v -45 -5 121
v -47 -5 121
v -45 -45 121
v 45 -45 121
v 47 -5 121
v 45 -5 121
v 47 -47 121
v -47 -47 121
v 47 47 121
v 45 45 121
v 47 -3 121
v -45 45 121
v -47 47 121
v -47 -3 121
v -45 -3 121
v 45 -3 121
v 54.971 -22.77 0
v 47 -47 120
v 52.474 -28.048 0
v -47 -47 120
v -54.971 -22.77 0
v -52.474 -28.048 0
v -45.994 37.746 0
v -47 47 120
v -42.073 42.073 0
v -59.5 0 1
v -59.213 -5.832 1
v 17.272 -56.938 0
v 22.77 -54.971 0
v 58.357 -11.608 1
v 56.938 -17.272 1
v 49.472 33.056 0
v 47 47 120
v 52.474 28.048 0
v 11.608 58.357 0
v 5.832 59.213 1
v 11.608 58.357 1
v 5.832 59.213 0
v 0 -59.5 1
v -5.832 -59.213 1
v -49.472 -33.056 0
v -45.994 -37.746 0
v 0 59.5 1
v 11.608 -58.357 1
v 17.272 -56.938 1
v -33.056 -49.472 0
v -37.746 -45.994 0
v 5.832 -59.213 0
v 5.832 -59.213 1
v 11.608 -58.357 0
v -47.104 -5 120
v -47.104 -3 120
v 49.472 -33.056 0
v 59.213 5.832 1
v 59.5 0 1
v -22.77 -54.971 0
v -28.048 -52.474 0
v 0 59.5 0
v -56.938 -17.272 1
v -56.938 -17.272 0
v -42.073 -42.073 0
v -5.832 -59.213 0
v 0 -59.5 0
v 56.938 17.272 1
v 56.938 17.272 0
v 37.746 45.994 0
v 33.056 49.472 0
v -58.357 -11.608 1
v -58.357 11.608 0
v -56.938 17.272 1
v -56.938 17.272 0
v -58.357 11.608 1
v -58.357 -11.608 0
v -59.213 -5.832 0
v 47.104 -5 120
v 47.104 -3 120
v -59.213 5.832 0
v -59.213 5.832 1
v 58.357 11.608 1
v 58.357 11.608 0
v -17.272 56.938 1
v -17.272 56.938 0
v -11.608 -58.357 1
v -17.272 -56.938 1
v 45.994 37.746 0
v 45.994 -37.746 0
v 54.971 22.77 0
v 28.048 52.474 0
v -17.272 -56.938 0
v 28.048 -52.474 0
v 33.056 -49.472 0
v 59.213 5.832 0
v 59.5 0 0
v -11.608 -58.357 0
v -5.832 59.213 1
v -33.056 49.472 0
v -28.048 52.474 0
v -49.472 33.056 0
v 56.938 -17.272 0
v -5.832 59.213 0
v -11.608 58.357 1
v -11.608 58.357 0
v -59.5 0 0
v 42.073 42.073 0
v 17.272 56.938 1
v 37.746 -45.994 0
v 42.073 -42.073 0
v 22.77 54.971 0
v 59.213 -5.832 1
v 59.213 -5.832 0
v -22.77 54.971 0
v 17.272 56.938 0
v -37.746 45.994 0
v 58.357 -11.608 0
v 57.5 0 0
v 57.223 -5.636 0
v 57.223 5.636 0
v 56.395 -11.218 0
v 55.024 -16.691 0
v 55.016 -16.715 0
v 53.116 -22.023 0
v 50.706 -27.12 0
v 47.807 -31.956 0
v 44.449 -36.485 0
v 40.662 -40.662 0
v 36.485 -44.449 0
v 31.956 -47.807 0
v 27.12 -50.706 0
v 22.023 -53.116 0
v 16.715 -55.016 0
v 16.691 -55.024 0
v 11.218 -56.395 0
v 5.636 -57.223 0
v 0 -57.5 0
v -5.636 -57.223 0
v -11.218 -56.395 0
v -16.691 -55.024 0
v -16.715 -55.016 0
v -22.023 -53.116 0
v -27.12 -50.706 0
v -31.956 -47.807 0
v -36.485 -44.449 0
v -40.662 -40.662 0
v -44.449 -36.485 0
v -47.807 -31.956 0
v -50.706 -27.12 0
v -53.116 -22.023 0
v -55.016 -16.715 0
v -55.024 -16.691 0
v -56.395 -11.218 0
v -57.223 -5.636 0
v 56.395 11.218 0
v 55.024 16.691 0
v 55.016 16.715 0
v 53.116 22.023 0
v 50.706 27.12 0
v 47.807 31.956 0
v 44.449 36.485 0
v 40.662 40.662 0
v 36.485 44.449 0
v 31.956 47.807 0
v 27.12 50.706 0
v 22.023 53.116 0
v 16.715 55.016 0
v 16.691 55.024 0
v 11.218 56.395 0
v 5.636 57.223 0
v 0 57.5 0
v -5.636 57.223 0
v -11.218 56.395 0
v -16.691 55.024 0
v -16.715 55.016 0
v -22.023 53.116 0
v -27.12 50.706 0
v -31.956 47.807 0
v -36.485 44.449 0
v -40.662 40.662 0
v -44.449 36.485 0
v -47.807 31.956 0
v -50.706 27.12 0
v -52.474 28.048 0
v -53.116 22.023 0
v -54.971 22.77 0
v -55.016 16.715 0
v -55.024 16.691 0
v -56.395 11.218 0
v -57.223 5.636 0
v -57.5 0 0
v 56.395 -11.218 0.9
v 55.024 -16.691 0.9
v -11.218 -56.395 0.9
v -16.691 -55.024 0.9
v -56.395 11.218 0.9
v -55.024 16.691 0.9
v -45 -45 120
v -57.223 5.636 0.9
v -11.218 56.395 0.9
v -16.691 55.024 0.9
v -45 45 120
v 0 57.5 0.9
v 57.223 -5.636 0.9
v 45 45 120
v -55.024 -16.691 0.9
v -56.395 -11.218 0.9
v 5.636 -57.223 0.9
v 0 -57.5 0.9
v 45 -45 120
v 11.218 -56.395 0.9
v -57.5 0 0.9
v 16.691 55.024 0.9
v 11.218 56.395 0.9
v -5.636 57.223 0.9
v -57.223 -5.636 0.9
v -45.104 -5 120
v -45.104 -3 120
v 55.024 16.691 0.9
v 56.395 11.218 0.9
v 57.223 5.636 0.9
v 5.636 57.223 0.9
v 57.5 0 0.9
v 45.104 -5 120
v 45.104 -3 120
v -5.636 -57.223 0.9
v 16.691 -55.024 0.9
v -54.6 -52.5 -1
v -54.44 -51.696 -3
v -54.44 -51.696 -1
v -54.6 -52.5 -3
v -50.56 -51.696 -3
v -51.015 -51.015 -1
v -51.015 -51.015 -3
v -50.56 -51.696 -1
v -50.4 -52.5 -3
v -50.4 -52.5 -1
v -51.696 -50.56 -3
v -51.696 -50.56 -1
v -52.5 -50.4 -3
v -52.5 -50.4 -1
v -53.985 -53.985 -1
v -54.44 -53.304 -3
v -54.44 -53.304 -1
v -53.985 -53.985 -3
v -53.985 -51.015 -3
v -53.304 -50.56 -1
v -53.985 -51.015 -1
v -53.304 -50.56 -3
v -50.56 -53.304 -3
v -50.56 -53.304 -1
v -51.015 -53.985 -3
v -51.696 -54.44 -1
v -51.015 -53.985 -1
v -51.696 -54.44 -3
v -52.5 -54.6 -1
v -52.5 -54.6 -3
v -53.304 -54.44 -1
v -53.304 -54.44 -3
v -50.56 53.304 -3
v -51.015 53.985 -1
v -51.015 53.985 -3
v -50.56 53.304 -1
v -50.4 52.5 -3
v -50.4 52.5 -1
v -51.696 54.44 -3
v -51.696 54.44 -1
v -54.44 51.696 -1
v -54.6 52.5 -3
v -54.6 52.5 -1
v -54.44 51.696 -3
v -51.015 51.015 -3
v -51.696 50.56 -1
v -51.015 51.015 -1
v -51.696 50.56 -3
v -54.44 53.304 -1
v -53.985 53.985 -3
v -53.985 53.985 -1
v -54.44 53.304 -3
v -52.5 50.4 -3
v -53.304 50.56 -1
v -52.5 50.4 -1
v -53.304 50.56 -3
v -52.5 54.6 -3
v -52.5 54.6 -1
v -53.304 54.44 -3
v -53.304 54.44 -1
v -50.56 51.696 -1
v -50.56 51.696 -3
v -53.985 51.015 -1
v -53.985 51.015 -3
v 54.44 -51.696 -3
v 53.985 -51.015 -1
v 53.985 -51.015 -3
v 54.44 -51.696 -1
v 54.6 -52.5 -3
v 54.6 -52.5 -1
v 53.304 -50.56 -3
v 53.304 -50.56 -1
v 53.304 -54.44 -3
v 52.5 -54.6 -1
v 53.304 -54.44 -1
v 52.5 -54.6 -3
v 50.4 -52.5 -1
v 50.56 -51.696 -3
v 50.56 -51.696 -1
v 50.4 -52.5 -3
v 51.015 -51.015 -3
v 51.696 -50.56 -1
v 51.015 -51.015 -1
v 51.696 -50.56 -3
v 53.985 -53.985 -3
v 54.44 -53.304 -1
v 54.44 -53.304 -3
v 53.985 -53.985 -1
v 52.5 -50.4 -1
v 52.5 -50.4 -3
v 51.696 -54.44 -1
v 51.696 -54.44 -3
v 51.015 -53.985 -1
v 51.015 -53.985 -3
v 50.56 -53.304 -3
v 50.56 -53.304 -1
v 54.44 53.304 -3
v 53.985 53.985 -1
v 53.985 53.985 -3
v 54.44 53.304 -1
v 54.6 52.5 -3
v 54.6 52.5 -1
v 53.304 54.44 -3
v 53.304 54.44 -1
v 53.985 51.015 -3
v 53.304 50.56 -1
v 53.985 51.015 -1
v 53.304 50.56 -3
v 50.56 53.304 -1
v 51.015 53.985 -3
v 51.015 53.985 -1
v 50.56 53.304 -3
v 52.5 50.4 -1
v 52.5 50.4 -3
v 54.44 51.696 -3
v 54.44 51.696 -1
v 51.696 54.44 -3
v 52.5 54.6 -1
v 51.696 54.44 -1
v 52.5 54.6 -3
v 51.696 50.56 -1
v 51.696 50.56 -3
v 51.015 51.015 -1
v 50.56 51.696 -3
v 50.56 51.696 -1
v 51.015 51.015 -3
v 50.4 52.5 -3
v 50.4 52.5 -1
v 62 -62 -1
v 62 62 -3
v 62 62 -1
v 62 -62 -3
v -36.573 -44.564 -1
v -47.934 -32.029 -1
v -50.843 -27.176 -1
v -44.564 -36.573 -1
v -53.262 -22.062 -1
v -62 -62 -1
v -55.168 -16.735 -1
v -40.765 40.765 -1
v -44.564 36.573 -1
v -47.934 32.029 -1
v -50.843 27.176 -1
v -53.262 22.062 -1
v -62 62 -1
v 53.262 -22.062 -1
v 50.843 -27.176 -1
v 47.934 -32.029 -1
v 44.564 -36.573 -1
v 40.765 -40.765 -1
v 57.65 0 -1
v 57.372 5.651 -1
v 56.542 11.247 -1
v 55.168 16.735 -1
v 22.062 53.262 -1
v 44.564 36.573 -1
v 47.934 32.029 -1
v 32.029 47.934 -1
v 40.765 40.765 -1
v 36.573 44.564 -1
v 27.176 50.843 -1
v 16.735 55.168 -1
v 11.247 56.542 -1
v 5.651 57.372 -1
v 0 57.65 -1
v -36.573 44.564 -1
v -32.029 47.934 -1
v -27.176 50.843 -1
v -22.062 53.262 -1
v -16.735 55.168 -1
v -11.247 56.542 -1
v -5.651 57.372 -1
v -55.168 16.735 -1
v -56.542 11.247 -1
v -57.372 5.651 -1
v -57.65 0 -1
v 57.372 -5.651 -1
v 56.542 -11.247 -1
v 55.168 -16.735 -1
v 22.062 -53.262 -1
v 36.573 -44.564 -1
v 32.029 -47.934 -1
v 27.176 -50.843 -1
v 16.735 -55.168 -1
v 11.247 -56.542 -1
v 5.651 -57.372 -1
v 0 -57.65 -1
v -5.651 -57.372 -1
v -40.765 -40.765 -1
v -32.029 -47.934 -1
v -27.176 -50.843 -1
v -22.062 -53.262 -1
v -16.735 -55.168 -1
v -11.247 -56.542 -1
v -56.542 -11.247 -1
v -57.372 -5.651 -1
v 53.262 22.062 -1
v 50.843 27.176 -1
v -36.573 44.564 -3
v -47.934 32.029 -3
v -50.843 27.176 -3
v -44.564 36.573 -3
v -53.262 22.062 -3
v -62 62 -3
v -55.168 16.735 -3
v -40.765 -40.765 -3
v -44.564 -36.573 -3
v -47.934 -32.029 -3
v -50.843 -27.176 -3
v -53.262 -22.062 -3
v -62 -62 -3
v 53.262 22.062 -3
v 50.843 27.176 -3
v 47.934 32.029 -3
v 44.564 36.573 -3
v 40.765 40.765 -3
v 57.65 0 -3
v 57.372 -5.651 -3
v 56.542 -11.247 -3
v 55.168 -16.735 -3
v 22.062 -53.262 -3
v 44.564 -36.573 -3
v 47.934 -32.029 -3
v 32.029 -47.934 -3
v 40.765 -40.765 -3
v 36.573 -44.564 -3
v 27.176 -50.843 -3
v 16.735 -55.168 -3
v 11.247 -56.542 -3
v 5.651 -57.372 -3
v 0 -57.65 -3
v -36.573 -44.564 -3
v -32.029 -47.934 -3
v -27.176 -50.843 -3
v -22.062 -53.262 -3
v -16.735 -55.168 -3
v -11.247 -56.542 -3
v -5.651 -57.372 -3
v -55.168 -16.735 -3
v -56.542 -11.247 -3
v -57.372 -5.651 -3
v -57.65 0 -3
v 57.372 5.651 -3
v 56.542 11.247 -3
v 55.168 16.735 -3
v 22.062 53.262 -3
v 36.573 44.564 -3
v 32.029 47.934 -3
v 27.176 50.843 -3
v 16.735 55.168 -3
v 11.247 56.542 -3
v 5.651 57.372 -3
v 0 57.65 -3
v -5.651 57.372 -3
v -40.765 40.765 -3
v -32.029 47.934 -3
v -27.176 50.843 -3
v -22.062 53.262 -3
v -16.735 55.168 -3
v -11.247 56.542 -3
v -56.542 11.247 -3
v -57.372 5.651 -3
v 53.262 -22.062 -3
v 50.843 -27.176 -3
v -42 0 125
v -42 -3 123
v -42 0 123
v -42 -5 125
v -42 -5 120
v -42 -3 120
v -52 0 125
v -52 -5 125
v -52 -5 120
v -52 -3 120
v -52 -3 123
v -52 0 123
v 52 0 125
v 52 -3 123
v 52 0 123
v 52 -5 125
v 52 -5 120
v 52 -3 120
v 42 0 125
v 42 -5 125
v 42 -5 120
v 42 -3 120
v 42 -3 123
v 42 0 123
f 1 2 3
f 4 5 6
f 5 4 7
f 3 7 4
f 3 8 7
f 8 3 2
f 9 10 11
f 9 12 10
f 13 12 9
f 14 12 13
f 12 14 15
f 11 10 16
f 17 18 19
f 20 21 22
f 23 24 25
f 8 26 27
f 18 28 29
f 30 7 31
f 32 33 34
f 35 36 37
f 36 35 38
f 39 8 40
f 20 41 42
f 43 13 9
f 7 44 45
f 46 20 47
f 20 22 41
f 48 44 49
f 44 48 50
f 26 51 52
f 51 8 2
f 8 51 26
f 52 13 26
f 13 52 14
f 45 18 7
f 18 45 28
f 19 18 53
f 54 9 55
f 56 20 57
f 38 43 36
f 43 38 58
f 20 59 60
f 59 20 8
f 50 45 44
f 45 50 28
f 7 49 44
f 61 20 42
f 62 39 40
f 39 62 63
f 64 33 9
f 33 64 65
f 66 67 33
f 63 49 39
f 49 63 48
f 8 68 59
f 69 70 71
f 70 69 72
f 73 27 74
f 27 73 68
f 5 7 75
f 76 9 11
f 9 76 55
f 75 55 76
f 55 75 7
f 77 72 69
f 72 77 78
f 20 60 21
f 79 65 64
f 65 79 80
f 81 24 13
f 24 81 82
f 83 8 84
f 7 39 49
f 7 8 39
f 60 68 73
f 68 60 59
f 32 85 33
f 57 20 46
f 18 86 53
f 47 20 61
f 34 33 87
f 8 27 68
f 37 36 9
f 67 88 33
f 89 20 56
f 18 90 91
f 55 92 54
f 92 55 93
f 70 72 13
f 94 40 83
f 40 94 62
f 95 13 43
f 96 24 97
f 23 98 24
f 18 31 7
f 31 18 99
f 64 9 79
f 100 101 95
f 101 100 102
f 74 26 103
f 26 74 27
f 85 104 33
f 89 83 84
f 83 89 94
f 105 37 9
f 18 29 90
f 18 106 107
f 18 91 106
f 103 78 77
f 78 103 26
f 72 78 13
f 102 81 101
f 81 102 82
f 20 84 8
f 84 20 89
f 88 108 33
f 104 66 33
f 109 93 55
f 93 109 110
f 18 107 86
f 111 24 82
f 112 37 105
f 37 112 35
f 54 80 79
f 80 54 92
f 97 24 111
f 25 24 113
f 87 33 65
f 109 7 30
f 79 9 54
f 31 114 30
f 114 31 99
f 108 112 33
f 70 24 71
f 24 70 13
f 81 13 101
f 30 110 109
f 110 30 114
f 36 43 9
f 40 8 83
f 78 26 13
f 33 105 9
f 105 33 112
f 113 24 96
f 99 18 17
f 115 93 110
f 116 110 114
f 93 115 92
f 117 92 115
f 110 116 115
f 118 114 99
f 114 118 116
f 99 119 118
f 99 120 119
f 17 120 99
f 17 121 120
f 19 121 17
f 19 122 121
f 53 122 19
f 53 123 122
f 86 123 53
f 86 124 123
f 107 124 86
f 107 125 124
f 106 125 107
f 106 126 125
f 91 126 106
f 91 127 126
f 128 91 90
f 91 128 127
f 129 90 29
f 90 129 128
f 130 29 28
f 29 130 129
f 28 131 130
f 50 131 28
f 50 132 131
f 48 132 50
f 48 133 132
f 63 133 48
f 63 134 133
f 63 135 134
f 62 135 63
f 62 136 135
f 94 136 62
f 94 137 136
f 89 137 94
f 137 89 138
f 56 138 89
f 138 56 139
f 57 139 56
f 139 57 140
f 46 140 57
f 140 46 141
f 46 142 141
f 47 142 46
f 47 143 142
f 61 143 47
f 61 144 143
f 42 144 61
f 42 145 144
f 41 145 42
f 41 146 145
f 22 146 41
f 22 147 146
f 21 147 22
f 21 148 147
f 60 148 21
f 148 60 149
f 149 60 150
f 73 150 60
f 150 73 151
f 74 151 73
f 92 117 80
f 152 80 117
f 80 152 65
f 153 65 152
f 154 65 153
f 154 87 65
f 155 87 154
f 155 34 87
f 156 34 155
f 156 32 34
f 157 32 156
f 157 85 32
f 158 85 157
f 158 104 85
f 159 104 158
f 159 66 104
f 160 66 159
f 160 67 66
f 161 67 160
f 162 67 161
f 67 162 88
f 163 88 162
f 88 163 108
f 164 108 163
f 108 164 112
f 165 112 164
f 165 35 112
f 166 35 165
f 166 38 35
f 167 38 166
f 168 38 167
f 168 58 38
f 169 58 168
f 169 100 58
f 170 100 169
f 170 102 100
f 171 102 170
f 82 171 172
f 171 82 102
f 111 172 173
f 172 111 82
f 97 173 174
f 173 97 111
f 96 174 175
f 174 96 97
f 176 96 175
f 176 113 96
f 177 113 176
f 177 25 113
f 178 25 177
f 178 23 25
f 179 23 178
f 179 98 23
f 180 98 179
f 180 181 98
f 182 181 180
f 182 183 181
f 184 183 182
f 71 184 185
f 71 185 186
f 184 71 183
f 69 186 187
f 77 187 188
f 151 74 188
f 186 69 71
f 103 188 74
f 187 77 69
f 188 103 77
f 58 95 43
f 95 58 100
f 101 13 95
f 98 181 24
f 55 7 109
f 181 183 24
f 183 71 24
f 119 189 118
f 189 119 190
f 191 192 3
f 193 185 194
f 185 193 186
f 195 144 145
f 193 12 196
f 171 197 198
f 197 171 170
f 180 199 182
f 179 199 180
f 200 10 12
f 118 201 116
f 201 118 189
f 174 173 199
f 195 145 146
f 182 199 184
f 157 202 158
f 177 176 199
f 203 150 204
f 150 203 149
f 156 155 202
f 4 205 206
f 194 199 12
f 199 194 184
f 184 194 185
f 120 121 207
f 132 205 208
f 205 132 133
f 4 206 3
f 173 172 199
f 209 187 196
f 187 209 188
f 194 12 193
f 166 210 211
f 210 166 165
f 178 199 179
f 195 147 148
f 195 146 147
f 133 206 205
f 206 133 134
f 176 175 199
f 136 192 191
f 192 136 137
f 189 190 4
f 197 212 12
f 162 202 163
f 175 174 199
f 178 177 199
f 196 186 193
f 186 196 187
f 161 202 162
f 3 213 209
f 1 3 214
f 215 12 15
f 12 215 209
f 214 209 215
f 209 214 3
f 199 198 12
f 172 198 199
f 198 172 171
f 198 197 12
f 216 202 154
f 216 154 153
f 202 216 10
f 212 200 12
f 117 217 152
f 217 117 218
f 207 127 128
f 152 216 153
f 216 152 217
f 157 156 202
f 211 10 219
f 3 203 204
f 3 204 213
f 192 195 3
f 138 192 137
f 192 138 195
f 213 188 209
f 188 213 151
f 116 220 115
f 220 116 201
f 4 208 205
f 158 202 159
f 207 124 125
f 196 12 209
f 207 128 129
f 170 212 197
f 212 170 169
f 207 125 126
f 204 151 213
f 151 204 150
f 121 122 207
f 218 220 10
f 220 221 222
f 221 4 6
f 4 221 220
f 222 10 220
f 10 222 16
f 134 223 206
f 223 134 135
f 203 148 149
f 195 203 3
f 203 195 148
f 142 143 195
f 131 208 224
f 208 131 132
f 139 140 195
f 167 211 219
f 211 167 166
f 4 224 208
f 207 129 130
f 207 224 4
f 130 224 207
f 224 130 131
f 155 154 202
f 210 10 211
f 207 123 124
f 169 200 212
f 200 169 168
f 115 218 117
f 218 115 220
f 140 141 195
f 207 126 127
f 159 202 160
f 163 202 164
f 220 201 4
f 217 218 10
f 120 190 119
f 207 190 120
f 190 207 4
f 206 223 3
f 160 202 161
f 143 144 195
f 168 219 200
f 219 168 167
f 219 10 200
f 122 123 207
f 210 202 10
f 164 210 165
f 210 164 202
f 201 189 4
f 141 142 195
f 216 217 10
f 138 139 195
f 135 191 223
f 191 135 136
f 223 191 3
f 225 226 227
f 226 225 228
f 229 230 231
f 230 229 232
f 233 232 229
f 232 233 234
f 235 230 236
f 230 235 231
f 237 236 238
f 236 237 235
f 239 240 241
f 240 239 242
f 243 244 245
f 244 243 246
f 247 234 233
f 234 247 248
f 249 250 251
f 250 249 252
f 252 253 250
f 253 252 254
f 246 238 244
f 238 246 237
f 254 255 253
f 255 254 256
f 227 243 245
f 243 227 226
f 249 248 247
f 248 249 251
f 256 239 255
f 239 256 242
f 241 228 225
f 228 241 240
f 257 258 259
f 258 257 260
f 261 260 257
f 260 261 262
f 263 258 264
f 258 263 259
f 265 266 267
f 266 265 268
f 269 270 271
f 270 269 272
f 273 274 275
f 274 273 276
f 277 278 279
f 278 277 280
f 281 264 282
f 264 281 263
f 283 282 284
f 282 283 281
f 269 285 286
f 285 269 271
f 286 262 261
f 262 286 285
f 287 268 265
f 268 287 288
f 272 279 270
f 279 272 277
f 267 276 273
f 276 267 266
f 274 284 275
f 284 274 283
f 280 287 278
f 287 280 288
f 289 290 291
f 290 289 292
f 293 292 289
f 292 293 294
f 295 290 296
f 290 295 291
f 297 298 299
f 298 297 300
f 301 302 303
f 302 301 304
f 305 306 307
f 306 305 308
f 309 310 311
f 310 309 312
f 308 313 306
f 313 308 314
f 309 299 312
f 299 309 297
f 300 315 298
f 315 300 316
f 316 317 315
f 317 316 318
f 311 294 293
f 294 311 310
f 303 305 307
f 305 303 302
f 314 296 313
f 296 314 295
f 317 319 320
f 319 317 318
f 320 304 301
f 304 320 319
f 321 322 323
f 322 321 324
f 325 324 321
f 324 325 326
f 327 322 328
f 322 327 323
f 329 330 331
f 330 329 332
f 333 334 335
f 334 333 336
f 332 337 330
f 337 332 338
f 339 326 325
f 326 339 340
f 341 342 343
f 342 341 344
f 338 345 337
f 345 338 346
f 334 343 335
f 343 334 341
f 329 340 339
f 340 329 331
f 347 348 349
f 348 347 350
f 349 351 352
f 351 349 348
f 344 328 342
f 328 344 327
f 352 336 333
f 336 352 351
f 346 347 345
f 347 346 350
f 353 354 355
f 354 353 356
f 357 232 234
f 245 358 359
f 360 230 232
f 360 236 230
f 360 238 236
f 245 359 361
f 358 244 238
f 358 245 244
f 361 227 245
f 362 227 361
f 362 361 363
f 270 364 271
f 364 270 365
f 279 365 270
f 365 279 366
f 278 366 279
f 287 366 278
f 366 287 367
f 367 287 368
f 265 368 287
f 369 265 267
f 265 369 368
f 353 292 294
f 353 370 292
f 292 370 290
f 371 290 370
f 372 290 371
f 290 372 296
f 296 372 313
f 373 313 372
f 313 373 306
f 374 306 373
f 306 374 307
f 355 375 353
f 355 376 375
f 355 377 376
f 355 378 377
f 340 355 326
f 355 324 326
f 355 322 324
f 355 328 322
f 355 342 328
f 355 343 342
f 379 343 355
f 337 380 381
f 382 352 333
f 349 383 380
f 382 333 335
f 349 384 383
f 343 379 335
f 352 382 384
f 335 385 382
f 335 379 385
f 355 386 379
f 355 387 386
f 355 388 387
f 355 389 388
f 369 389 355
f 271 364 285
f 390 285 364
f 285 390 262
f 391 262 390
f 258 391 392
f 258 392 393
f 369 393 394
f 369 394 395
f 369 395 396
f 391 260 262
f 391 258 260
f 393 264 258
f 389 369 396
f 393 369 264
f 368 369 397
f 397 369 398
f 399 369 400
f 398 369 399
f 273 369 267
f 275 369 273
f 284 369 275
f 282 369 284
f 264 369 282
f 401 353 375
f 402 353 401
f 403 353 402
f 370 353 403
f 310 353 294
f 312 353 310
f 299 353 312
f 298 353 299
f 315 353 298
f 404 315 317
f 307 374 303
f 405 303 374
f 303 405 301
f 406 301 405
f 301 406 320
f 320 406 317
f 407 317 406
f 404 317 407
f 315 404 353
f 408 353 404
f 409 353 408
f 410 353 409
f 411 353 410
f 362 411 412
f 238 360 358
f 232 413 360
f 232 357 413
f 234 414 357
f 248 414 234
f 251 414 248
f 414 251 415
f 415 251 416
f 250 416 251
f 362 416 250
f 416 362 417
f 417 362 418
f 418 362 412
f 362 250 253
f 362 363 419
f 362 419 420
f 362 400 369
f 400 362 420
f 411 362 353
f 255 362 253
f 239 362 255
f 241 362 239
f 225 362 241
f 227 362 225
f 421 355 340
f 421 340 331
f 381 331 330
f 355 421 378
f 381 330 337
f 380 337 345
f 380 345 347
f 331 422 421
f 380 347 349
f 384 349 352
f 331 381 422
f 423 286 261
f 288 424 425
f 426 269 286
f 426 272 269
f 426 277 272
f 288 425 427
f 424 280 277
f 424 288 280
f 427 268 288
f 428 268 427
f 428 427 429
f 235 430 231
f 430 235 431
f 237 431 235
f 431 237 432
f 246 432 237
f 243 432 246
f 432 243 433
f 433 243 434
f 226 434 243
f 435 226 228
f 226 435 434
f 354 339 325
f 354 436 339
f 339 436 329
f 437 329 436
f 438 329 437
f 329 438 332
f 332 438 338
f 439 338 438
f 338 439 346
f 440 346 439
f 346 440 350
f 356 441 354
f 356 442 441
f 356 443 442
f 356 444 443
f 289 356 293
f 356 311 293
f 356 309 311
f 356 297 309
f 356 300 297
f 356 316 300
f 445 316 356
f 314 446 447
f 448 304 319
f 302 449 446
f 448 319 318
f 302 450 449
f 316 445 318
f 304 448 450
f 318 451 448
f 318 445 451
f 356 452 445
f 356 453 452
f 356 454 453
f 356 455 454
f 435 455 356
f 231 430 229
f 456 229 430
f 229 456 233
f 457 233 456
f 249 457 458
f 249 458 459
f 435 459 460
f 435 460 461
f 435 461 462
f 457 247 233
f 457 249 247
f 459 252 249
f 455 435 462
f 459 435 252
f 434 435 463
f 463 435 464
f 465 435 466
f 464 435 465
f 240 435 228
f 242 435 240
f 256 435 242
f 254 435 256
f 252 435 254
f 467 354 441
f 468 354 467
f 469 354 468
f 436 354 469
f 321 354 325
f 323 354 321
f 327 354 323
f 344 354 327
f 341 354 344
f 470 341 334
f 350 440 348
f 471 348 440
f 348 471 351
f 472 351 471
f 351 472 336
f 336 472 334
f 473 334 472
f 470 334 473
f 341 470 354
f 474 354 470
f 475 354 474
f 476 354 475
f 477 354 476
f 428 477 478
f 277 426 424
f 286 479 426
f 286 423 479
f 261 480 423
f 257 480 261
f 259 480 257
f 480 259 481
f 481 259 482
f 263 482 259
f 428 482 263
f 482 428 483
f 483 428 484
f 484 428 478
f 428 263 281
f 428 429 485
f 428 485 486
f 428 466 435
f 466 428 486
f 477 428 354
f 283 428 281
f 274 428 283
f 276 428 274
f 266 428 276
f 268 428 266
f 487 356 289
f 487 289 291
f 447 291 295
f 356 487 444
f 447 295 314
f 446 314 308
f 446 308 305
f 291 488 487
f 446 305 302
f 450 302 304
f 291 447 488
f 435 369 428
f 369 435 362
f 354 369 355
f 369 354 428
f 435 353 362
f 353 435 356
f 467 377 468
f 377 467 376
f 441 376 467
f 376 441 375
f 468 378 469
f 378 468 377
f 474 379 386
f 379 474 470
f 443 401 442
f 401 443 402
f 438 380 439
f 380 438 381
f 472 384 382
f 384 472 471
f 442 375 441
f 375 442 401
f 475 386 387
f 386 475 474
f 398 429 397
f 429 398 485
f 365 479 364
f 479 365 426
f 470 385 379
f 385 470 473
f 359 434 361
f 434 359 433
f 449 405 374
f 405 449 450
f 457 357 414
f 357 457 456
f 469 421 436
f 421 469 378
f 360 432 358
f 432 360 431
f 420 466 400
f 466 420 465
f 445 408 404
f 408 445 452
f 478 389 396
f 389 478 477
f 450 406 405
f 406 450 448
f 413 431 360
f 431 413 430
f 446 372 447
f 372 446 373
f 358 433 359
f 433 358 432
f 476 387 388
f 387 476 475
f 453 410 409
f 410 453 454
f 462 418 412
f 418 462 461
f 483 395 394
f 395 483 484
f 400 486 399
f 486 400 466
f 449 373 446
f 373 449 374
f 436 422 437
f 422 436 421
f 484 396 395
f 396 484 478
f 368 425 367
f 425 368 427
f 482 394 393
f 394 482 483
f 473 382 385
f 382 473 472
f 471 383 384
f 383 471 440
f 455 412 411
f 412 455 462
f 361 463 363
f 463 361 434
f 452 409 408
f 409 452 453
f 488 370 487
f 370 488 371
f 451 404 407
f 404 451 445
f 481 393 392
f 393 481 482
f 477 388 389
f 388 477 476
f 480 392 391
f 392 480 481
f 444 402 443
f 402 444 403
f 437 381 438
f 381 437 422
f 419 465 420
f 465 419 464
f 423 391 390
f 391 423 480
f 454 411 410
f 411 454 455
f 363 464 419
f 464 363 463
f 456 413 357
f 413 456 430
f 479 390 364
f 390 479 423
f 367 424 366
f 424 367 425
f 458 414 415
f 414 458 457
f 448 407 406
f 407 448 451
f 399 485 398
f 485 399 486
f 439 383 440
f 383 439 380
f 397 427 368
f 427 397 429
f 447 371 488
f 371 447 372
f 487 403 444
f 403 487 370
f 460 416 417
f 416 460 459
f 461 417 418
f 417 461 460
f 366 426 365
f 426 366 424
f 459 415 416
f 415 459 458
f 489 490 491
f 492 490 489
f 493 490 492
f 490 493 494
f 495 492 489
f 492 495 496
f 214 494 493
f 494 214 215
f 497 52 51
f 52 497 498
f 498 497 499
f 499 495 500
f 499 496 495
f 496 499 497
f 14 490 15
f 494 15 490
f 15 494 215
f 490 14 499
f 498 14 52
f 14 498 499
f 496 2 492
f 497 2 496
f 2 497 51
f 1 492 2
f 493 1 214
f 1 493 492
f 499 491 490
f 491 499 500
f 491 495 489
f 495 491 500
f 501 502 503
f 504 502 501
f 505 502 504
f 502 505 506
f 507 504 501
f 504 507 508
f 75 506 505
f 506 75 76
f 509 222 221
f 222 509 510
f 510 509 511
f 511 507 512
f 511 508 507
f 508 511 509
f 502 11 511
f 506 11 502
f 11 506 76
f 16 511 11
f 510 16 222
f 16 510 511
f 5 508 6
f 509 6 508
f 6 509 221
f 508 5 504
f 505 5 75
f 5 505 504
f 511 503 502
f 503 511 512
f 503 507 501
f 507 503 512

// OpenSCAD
// =============================================================================
// ISKANDER HEARTH — Fan Duct v1
// File: fan_duct_v1.scad
// =============================================================================
// License : CERN Open Hardware Licence v2 – Strongly Reciprocal (CERN-OHL-S)
// Phase   : 7 — Thermal & Acoustic Validation
//
// A parametric airflow duct that mounts to a standard 120mm fan using the
// 105mm screw hole pattern and channels airflow toward the motherboard zone.
//
// TWO VARIANTS (set duct_type below):
//   "intake"  — Top-panel intake duct. Directs fan-driven air downward into
//               the MB area, increasing CPU cooler effectiveness. Flares from
//               the 115mm fan aperture to a 90×90mm square outlet at MB level.
//
//   "exhaust" — Rear-panel exhaust collector. Sweeps hot GPU exhaust air from
//               the GPU zone into the 120mm exhaust fan aperture, reducing
//               recirculation and improving exhaust efficiency.
//
// PRINT CONSTRAINTS (all variants):
//   - Zero supports required. All overhangs ≤ 45° from vertical.
//   - Walls ≥ 2mm throughout for structural rigidity.
//   - Snap clips engage the chassis inner-wall fan mount lip.
//
// TARGET FAN: Noctua NF-A12x25 PWM (P7-001)
//   120mm, 105mm screw spacing, 25mm depth
//   Max flow: 102.1 m³/h at 2000 RPM
//
// PRINT SETTINGS:
//   Material: PETG (heat-resistant, ≤ 80°C chassis temps)
//   Layer:    0.2mm | Perimeters: 3 | Infill: 20% gyroid
//   Orientation: Print duct standing upright (longest dimension vertical)
// =============================================================================


// =============================================================================
// SECTION 1 — PARAMETERS
// =============================================================================

duct_type           = "intake";  // "intake" or "exhaust"  <-- CHANGE ME

// --- Fan mount geometry (Noctua NF-A12x25 / standard 120mm) ---
fan_size            = 120;       // [mm] Fan frame outer dimension
fan_aperture_d      = 115;       // [mm] Clear airflow aperture diameter
fan_screw_spacing   = 105;       // [mm] Screw hole centre-to-centre (square pattern)
fan_screw_d         = 4.2;       // [mm] M4 clearance hole (standard fan screw)
fan_mount_depth     = 25;        // [mm] Fan body depth (NF-A12x25)

// --- Duct body ---
duct_wall_t         = 2.0;       // [mm] Duct wall thickness (min for structural integrity)
duct_length         = 120;       // [mm] Duct axial length (fan face to outlet)
                                  //      Intake: from top panel down toward MB
                                  //      Exhaust: from GPU zone to rear panel fan

// --- Intake duct outlet (square, aimed at MB) ---
outlet_w            = 90;        // [mm] Square outlet width (covers CPU cooler footprint)
outlet_h            = 90;        // [mm] Square outlet height

// --- Snap clip geometry (engages chassis inner-wall lip) ---
clip_w              = 10;        // [mm] Clip tab width
clip_t              = 2.0;       // [mm] Clip tab thickness
clip_h              = 5;         // [mm] Clip hook height (catches wall edge)
clip_gap            = 0.4;       // [mm] Clearance gap for clip engagement

// --- Fit tolerance ---
fit_tolerance       = 0.3;       // [mm] Press-fit for chassis slot interface


// =============================================================================
// SECTION 2 — DERIVED DIMENSIONS
// =============================================================================

fan_mount_half      = fan_size / 2;
screw_half          = fan_screw_spacing / 2;

// Transition from circular inlet (fan) to square outlet (MB area)
// Inlet inner radius = fan_aperture_d/2 at Z=0
// Outlet corner half-size = outlet_w/2, outlet_h/2 at Z=duct_length
inlet_r             = fan_aperture_d / 2;
outlet_half_w       = outlet_w / 2;
outlet_half_h       = outlet_h / 2;


// =============================================================================
// SECTION 3 — HELPER MODULES
// =============================================================================

// Fan mounting flange — flat plate with 4× M4 screw holes + central aperture
module fan_flange(t = duct_wall_t) {
    difference() {
        // Flange plate (slightly wider than fan frame for mounting overlap)
        cube([fan_size + 4, fan_size + 4, t], center = true);

        // Central airflow aperture
        cylinder(d = fan_aperture_d + fit_tolerance, h = t + 0.2, $fn = 64, center = true);

        // 4× M4 screw holes (fan mount pattern: 105mm square)
        for (sx = [-screw_half, screw_half]) {
            for (sy = [-screw_half, screw_half]) {
                translate([sx, sy, 0])
                cylinder(d = fan_screw_d, h = t + 0.2, $fn = 16, center = true);
            }
        }
    }
}

// Snap clip tab — hooks onto inner chassis wall lip
// Place at 4 positions around the duct perimeter
module snap_clip() {
    union() {
        // Clip arm
        cube([clip_w, clip_t, clip_h]);
        // Hook at the end
        translate([0, clip_t, clip_h - clip_t])
        cube([clip_w, clip_t * 1.5, clip_t]);
    }
}


// =============================================================================
// SECTION 4 — DUCT BODIES
// =============================================================================

module intake_duct() {
    // Intake duct: circular inlet at top (fan face) → square outlet at bottom (MB level)
    // No supports needed: walls lean inward ≤ 45° in all cross-sections.
    //
    // Built as a difference: outer shell minus inner air channel
    // Both transition from circle→square using hull() at intermediate stations.

    // Number of hull stations for smooth transition
    n_stations = 8;

    difference() {
        // ── Outer shell ───────────────────────────────────────────────────────
        hull() {
            // Top: circle matching fan aperture + wall thickness
            translate([0, 0, 0])
            cylinder(d = fan_aperture_d + duct_wall_t * 2, h = 1, $fn = 64);

            // Bottom: square matching outlet + wall thickness
            translate([
                -(outlet_half_w + duct_wall_t),
                -(outlet_half_h + duct_wall_t),
                duct_length
            ])
            cube([
                outlet_w + duct_wall_t * 2,
                outlet_h + duct_wall_t * 2,
                1
            ]);
        }

        // ── Inner air channel ─────────────────────────────────────────────────
        translate([0, 0, -0.1])
        hull() {
            cylinder(d = fan_aperture_d, h = 1, $fn = 64);
            translate([-outlet_half_w, -outlet_half_h, duct_length + 0.1])
            cube([outlet_w, outlet_h, 1]);
        }
    }

    // Fan flange at top
    translate([0, 0, -duct_wall_t])
    fan_flange(t = duct_wall_t);

    // Snap clips: 4× positioned at duct_length end (chassis inner wall engagement)
    clip_positions = [
        [ outlet_half_w + duct_wall_t - clip_w/2,  0,               duct_length],
        [-(outlet_half_w + duct_wall_t),             0,               duct_length],
        [ 0,  outlet_half_h + duct_wall_t - clip_w/2,  duct_length],
        [ 0, -(outlet_half_h + duct_wall_t),             duct_length],
    ];
    // Simplified: two clips on ±X faces
    for (sx = [-1, 1]) {
        translate([sx * (outlet_half_w + duct_wall_t) - clip_w/2, -clip_w/2, duct_length])
        snap_clip();
    }
}


module exhaust_duct() {
    // Exhaust collector: sweeps GPU zone hot air toward rear exhaust fan.
    // Square inlet at GPU zone side → circular fan flange at rear.
    // Geometry mirrors intake_duct() in reverse.

    // GPU zone inlet approximate size: 160×120mm (GPU exhaust column)
    gpu_inlet_w     = 160;
    gpu_inlet_h     = 120;
    gpu_inlet_half_w = gpu_inlet_w / 2;
    gpu_inlet_half_h = gpu_inlet_h / 2;

    difference() {
        hull() {
            // Rear end: circle for fan flange
            translate([0, 0, 0])
            cylinder(d = fan_aperture_d + duct_wall_t * 2, h = 1, $fn = 64);

            // Front end: rectangle for GPU exhaust inlet
            translate([
                -(gpu_inlet_half_w + duct_wall_t),
                -(gpu_inlet_half_h + duct_wall_t),
                duct_length
            ])
            cube([
                gpu_inlet_w + duct_wall_t * 2,
                gpu_inlet_h + duct_wall_t * 2,
                1
            ]);
        }

        // Inner channel
        translate([0, 0, -0.1])
        hull() {
            cylinder(d = fan_aperture_d, h = 1, $fn = 64);
            translate([-gpu_inlet_half_w, -gpu_inlet_half_h, duct_length + 0.1])
            cube([gpu_inlet_w, gpu_inlet_h, 1]);
        }
    }

    // Fan flange at rear face
    translate([0, 0, -duct_wall_t])
    fan_flange(t = duct_wall_t);
}


// =============================================================================
// SECTION 5 — RENDER
// =============================================================================

if (duct_type == "intake") {
    intake_duct();
} else if (duct_type == "exhaust") {
    exhaust_duct();
} else {
    echo("ERROR: set duct_type to \"intake\" or \"exhaust\"");
}

// Fan ghost (for alignment check):
// %translate([0, 0, -(fan_mount_depth + duct_wall_t)])
//     color("silver", 0.3) cube([fan_size, fan_size, fan_mount_depth], center=true);
